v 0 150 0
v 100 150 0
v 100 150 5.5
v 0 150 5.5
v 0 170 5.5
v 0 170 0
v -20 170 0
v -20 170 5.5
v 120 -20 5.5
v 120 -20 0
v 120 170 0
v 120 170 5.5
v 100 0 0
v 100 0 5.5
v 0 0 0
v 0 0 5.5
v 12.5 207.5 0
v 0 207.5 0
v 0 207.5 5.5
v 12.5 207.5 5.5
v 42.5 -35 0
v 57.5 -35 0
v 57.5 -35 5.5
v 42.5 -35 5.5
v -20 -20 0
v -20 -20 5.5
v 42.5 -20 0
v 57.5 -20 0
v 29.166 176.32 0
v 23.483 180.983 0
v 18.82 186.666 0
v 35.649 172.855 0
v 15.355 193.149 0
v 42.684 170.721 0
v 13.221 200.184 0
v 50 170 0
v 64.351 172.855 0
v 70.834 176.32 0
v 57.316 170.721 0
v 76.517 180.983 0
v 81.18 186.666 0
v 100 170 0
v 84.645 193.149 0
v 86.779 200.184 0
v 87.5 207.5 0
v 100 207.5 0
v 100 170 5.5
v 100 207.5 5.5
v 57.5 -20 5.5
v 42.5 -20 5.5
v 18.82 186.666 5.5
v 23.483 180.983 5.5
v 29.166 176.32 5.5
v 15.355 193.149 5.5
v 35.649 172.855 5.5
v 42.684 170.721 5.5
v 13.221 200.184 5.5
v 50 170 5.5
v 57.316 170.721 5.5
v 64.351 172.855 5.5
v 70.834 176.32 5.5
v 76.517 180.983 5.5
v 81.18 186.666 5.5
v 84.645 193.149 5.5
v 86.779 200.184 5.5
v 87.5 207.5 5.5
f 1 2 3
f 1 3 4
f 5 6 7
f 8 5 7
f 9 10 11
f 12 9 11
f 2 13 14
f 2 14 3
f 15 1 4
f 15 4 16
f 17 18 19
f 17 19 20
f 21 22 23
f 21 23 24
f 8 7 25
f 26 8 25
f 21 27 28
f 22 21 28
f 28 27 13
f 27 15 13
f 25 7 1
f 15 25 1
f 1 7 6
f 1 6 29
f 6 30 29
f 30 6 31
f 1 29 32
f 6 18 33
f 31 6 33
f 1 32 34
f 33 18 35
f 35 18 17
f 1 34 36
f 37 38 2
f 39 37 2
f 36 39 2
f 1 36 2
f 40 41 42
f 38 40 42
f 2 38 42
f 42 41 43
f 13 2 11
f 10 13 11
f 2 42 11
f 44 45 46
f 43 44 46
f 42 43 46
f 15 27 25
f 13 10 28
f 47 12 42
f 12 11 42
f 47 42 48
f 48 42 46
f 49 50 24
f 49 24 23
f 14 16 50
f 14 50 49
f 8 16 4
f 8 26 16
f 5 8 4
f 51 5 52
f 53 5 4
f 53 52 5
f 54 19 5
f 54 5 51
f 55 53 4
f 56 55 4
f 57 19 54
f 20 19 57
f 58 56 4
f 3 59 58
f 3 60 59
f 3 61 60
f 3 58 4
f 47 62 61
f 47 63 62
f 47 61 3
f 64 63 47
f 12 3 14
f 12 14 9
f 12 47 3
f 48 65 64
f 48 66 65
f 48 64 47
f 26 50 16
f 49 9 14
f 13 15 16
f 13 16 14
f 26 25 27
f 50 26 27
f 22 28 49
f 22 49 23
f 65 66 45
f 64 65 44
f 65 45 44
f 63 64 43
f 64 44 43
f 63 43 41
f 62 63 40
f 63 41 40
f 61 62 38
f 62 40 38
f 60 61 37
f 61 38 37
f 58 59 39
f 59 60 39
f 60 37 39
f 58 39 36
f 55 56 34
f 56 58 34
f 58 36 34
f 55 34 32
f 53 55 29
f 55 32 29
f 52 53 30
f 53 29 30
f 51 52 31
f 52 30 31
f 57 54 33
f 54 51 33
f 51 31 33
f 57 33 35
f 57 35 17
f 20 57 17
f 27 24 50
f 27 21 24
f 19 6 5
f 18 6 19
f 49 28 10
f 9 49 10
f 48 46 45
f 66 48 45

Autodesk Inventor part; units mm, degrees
ref_plane "YZ Plane" through (0, 0, 0) normal (1, 0, 0) x (0, 1, 0)
ref_plane "XZ Plane" through (0, 0, 0) normal (0, 1, 0) x (-1, 0, 0)
ref_plane "XY Plane" through (0, 0, 0) normal (0, 0, 1) x (1, 0, 0)
sketch "Sketch1" plane through (0, 0, 0) normal (0, 0, 1) x (1, 0, 0)
  line L0 (0, 0) -> (100, 0)
  line L1 (100, 0) -> (100, 150)
  line L2 (100, 150) -> (0, 150)
  line L3 (0, 150) -> (0, 0)
  circle A0 centre (50, 207.5) radius 37.5
  line L4 (-20, -20) -> (120, -20)
  line L5 (120, -20) -> (120, 170)
  line L6 (120, 170) -> (-20, 170)
  line L7 (-20, 170) -> (-20, -20)
  line L8 (0, 170) -> (100, 170)
  line L9 (49.5, -20) -> (59.5, -20)
  line L10 (45, -20) -> (60, -20)
  line L11 (42.5, -20) -> (57.5, -20)
  line L12 (57.5, -20) -> (57.5, -35)
  line L13 (57.5, -35) -> (42.5, -35)
  line L14 (42.5, -35) -> (42.5, -20)
  line L15 (100, 170) -> (100, 207.5)
  line L16 (100, 207.5) -> (87.5, 207.5)
  line L17 (0, 170) -> (0, 207.5)
  line L18 (0, 207.5) -> (12.5, 207.5)
  dimension "d0" = 75
  dimension "d1" = 140
  dimension "d3" = 15
  dimension "d4" = 15
extrude "Extrusion1" add sketch "Sketch1" along normal blind 5.5 contours L16 L15 L6 A0 | A0 L6 L17 L18 | L6 L5 L4 L7 | L4 L12 L13 L14
properties part number "anillo4"
